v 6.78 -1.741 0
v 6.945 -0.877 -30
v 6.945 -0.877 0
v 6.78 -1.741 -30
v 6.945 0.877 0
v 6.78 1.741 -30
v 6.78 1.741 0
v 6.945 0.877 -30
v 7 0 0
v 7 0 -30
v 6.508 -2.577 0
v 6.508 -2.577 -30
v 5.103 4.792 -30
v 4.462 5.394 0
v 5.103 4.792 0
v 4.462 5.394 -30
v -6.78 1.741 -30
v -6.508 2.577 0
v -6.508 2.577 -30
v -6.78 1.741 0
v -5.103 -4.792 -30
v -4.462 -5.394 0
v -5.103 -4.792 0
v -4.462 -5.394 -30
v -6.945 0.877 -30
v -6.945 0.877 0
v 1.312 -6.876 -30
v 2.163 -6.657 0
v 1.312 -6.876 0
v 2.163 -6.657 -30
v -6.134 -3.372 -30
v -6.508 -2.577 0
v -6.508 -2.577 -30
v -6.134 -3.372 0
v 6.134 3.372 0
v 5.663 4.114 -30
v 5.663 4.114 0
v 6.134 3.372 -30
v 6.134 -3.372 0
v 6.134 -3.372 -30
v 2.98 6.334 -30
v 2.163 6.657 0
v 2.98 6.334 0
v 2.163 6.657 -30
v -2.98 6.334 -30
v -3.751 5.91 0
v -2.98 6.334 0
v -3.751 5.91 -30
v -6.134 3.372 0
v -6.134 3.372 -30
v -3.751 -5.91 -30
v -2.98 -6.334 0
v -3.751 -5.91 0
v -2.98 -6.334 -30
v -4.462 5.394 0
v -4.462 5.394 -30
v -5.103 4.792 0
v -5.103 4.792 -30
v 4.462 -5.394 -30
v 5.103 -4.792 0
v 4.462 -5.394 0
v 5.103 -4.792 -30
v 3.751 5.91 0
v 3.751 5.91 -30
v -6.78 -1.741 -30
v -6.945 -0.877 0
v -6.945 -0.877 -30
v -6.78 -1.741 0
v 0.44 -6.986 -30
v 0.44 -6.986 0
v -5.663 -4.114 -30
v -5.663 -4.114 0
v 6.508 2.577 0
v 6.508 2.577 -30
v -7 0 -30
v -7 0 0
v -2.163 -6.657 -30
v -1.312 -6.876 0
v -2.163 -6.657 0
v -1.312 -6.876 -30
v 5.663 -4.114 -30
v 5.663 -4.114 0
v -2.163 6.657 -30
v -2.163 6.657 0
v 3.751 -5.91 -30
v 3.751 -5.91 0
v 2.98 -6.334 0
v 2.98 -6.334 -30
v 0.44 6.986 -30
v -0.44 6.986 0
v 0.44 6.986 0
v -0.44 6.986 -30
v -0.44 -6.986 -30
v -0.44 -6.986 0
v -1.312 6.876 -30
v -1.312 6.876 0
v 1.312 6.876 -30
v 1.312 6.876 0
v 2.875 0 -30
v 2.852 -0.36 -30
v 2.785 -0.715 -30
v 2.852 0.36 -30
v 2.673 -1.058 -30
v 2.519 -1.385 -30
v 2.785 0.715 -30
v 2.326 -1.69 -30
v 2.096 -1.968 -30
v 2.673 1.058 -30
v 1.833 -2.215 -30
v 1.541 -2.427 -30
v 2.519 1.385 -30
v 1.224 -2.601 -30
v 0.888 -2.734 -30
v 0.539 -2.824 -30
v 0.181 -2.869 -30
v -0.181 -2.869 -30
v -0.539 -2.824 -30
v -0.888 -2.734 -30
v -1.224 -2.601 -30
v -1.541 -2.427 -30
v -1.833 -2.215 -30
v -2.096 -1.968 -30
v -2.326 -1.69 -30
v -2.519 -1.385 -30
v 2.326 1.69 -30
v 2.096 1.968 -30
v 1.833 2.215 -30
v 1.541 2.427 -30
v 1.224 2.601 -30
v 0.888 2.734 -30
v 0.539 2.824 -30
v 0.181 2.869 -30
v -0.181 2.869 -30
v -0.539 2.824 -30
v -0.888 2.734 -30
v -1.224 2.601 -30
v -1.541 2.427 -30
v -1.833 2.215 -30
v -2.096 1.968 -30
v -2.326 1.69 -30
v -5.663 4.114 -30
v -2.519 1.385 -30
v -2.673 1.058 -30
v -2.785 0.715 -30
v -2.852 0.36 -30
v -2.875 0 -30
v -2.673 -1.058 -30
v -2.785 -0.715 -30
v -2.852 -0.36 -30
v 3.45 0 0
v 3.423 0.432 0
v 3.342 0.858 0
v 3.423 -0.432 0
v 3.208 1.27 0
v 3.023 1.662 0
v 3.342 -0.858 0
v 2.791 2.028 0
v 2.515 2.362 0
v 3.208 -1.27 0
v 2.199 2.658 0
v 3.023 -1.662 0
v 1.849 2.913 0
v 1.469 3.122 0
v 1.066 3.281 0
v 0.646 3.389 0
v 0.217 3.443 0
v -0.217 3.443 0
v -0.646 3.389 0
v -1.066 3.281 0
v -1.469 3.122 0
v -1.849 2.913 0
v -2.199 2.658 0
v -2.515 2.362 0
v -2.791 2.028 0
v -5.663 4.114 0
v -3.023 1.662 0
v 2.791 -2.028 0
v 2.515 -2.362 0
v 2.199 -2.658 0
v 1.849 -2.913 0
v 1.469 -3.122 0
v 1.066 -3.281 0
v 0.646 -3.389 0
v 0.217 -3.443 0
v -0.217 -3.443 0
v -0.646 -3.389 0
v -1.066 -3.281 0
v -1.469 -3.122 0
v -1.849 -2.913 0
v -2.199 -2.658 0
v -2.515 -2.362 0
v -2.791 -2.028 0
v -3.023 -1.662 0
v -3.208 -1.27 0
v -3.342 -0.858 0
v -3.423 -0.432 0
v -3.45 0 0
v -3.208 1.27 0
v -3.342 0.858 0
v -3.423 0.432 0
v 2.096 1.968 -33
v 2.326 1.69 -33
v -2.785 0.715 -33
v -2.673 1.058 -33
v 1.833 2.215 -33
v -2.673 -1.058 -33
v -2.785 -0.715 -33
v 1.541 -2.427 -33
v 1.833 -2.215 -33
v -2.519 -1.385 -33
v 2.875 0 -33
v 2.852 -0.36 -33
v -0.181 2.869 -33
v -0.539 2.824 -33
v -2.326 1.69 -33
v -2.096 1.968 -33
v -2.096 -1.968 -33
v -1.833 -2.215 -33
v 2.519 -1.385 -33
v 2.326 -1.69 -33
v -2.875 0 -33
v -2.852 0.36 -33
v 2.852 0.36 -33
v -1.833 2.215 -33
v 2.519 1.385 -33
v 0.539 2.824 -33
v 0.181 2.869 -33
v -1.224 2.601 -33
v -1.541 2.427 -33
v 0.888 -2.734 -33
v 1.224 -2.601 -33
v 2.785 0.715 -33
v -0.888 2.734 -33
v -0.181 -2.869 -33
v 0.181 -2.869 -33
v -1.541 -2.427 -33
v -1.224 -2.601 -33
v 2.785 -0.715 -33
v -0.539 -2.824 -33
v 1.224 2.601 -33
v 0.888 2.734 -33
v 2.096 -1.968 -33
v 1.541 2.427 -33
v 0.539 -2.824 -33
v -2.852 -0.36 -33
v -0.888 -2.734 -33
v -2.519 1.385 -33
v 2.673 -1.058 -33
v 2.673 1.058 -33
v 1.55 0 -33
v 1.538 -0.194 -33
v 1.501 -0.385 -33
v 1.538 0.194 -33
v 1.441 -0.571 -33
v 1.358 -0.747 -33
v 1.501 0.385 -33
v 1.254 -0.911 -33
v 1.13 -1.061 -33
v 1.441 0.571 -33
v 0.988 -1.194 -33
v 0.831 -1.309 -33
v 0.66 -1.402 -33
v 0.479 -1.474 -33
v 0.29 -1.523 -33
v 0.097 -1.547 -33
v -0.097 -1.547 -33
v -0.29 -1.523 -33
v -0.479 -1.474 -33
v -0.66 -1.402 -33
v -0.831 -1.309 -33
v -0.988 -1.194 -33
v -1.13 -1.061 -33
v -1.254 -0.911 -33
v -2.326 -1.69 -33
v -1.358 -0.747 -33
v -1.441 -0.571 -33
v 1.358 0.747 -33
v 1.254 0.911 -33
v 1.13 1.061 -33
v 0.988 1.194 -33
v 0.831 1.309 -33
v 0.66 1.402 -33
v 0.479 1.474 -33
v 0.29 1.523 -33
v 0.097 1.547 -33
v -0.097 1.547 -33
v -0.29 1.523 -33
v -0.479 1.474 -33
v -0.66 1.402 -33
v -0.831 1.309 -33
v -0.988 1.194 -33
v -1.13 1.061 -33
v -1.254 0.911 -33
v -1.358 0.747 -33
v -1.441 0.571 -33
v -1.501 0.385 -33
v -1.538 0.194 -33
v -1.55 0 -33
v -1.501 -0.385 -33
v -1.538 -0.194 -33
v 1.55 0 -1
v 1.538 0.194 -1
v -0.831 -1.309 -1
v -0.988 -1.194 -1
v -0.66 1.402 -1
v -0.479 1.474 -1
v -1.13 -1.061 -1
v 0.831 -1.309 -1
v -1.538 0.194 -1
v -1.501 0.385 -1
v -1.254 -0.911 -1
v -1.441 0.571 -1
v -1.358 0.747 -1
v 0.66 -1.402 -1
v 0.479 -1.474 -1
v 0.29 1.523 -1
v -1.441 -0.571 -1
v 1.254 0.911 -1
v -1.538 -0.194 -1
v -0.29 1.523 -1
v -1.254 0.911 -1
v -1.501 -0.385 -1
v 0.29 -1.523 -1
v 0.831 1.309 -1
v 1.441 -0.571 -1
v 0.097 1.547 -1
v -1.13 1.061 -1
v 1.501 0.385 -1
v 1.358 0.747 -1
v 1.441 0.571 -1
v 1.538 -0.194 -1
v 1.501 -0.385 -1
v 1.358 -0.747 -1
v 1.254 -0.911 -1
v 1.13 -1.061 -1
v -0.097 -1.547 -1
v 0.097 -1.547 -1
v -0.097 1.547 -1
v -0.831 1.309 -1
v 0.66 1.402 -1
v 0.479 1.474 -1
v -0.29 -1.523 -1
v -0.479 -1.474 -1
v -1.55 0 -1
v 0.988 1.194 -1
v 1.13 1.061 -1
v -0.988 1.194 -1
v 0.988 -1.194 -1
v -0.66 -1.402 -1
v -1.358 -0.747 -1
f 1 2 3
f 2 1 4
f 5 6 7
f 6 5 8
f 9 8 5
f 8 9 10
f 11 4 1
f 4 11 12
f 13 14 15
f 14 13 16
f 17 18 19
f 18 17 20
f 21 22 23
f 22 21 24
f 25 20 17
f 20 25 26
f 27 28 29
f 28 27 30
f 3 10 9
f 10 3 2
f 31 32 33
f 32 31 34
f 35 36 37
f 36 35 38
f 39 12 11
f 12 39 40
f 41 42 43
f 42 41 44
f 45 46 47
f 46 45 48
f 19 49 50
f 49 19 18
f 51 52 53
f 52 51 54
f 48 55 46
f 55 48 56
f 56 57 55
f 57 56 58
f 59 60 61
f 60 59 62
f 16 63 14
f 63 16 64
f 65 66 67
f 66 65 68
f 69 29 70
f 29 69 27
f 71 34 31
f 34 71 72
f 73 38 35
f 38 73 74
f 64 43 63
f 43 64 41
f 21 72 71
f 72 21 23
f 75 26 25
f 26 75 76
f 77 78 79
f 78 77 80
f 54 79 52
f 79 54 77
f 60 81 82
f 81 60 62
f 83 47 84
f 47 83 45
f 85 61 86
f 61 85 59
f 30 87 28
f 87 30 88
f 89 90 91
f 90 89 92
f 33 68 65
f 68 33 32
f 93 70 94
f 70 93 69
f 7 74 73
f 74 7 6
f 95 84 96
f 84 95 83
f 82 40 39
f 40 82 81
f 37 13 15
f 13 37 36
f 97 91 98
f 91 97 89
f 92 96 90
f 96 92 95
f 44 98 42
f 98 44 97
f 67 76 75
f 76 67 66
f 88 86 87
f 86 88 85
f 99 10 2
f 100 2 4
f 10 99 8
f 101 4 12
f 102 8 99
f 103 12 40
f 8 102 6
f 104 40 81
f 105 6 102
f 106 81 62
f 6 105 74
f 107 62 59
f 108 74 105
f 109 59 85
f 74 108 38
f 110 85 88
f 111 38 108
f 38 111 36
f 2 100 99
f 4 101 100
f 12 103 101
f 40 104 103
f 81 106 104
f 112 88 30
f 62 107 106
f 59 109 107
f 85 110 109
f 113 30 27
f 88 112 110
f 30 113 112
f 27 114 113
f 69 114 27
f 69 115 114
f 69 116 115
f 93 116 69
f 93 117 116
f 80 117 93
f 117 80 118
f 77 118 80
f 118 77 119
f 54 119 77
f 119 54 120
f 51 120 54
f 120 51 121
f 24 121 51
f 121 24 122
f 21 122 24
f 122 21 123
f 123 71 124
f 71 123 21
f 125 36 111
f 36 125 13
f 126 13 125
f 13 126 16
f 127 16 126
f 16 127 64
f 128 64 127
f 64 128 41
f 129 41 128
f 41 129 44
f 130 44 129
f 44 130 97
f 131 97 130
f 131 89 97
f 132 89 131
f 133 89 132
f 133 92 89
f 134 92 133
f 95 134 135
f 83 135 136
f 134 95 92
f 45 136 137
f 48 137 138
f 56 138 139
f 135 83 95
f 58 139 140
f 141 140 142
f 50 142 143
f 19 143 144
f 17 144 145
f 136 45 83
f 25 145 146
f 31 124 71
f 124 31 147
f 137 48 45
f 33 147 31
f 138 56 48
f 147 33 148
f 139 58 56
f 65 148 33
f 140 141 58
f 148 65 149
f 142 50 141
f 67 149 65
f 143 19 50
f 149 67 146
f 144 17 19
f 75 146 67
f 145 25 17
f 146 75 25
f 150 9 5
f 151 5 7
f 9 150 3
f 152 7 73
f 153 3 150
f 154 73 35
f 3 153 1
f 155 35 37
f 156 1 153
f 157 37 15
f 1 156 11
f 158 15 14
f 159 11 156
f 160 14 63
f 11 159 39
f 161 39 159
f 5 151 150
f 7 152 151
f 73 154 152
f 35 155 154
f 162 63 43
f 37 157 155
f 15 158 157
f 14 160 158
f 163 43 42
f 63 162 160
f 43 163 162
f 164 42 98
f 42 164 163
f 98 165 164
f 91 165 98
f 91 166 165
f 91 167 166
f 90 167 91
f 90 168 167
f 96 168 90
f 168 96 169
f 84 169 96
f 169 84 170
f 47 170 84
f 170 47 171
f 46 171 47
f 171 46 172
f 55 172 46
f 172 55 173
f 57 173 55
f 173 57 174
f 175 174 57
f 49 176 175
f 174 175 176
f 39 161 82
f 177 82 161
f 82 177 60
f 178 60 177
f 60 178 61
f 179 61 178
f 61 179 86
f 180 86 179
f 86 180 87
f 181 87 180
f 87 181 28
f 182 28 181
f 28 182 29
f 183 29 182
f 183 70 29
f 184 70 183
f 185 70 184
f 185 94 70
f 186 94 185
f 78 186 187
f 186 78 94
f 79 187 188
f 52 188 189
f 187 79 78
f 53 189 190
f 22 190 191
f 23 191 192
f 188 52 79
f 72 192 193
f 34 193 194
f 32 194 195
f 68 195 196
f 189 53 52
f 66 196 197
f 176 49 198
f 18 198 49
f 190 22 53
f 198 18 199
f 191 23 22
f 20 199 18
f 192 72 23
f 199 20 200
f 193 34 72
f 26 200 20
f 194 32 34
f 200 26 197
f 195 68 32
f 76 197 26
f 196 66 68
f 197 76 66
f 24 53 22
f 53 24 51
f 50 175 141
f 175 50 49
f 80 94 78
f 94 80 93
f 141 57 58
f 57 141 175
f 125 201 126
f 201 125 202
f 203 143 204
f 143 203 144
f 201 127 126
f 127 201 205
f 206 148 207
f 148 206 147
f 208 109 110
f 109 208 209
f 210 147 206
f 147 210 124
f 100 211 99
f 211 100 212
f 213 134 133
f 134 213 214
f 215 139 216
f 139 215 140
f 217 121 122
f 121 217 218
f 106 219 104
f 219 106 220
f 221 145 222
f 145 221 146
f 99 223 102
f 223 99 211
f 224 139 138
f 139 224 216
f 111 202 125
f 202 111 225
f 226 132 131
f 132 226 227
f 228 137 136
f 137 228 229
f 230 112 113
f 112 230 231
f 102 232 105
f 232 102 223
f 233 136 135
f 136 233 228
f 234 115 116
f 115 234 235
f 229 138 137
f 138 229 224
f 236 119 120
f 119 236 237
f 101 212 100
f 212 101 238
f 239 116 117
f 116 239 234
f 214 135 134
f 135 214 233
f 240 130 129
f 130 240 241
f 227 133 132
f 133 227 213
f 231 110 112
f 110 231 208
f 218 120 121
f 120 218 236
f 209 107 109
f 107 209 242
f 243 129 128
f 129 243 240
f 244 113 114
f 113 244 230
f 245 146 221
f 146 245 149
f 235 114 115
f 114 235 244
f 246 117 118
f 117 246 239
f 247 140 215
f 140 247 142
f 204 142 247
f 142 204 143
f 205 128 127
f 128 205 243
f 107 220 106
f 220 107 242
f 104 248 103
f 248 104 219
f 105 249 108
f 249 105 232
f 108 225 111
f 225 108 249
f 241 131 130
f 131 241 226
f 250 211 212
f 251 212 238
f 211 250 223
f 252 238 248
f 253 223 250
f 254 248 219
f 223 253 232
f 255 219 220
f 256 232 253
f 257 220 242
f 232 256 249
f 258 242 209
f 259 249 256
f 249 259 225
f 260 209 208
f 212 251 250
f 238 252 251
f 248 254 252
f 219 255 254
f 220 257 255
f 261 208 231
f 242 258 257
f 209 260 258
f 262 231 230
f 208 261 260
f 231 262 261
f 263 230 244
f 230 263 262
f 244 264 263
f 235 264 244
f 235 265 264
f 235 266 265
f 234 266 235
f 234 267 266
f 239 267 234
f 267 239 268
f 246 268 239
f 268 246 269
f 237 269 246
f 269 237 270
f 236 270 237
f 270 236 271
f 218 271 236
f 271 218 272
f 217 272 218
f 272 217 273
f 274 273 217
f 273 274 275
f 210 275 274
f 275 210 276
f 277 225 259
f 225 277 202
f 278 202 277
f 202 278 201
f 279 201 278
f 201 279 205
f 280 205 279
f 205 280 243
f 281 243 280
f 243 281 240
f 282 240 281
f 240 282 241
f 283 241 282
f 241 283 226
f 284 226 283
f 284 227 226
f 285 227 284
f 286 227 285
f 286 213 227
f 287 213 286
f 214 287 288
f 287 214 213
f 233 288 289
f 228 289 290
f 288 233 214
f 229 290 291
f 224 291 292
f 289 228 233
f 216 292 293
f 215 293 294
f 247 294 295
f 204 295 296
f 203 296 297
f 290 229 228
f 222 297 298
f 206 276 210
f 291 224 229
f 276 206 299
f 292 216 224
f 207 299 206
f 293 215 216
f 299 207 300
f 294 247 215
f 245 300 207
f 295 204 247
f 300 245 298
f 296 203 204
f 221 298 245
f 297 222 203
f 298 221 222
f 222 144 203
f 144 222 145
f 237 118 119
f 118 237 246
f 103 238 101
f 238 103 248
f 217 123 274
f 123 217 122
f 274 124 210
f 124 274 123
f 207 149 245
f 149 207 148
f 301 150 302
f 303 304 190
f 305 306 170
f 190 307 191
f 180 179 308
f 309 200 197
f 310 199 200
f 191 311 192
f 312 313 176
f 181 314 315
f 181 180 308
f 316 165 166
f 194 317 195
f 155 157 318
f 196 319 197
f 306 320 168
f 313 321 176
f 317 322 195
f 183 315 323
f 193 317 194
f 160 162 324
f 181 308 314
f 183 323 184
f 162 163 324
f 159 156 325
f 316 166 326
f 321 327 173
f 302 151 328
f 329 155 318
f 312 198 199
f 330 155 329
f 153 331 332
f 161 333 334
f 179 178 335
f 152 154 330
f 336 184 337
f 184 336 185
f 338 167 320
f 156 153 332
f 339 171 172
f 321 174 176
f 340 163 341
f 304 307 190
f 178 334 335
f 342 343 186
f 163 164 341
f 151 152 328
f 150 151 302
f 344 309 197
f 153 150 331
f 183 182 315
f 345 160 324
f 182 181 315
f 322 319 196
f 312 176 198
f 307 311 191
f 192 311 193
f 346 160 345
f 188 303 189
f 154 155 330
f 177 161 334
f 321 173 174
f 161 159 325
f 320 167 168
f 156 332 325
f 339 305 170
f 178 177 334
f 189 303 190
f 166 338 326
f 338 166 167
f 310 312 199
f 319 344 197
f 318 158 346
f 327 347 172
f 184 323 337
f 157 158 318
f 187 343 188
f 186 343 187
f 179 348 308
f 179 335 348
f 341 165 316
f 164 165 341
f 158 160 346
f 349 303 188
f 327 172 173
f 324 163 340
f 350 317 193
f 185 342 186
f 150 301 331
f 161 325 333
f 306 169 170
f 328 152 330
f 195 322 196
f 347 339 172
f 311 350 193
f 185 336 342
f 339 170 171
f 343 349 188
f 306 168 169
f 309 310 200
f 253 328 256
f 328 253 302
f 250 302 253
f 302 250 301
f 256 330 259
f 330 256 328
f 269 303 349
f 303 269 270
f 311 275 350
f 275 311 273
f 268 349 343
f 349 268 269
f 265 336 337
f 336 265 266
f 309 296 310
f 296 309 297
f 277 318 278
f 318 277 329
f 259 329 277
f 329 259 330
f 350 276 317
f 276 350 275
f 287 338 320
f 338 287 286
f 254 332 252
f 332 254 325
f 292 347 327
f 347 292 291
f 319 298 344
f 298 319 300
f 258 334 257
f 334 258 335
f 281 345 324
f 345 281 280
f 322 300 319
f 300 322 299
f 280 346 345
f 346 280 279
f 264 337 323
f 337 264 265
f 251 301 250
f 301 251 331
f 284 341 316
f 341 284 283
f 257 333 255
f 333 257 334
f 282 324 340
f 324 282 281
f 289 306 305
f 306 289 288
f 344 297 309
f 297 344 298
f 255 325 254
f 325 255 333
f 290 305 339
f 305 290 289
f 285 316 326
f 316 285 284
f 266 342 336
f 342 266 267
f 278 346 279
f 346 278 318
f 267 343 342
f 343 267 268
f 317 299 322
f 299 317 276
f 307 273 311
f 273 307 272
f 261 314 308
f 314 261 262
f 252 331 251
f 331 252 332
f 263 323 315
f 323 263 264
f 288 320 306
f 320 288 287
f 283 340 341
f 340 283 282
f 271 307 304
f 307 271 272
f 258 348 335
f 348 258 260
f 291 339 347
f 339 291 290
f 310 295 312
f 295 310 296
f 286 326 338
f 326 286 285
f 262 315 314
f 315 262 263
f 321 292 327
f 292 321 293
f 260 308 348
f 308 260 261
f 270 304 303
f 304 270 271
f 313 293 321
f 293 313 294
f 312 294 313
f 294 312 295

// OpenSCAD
$fn = 50;

difference() {
	union() {
		translate(v = [0, 0, -30.0]) {
			cylinder(h = 30, r = 7.0);
		}
		#translate(v = [0, 0, -33.0]) {
			cylinder(h = 33, r = 2.875);
		}
	}
	union() {
		translate(v = [0, 0, 0]) {
			rotate(a = [0, 0, 0]) {
				difference() {
					union() {
						translate(v = [0, 0, -33.0]) {
							cylinder(h = 33, r = 1.25);
						}
						translate(v = [0, 0, -1.0]) {
							cylinder(h = 1.0, r1 = 1.55, r2 = 3.45);
						}
						translate(v = [0, 0, -33.0]) {
							cylinder(h = 33, r = 1.55);
						}
						translate(v = [0, 0, -33.0]) {
							cylinder(h = 33, r = 1.25);
						}
					}
					union();
				}
			}
		}
	}
}
